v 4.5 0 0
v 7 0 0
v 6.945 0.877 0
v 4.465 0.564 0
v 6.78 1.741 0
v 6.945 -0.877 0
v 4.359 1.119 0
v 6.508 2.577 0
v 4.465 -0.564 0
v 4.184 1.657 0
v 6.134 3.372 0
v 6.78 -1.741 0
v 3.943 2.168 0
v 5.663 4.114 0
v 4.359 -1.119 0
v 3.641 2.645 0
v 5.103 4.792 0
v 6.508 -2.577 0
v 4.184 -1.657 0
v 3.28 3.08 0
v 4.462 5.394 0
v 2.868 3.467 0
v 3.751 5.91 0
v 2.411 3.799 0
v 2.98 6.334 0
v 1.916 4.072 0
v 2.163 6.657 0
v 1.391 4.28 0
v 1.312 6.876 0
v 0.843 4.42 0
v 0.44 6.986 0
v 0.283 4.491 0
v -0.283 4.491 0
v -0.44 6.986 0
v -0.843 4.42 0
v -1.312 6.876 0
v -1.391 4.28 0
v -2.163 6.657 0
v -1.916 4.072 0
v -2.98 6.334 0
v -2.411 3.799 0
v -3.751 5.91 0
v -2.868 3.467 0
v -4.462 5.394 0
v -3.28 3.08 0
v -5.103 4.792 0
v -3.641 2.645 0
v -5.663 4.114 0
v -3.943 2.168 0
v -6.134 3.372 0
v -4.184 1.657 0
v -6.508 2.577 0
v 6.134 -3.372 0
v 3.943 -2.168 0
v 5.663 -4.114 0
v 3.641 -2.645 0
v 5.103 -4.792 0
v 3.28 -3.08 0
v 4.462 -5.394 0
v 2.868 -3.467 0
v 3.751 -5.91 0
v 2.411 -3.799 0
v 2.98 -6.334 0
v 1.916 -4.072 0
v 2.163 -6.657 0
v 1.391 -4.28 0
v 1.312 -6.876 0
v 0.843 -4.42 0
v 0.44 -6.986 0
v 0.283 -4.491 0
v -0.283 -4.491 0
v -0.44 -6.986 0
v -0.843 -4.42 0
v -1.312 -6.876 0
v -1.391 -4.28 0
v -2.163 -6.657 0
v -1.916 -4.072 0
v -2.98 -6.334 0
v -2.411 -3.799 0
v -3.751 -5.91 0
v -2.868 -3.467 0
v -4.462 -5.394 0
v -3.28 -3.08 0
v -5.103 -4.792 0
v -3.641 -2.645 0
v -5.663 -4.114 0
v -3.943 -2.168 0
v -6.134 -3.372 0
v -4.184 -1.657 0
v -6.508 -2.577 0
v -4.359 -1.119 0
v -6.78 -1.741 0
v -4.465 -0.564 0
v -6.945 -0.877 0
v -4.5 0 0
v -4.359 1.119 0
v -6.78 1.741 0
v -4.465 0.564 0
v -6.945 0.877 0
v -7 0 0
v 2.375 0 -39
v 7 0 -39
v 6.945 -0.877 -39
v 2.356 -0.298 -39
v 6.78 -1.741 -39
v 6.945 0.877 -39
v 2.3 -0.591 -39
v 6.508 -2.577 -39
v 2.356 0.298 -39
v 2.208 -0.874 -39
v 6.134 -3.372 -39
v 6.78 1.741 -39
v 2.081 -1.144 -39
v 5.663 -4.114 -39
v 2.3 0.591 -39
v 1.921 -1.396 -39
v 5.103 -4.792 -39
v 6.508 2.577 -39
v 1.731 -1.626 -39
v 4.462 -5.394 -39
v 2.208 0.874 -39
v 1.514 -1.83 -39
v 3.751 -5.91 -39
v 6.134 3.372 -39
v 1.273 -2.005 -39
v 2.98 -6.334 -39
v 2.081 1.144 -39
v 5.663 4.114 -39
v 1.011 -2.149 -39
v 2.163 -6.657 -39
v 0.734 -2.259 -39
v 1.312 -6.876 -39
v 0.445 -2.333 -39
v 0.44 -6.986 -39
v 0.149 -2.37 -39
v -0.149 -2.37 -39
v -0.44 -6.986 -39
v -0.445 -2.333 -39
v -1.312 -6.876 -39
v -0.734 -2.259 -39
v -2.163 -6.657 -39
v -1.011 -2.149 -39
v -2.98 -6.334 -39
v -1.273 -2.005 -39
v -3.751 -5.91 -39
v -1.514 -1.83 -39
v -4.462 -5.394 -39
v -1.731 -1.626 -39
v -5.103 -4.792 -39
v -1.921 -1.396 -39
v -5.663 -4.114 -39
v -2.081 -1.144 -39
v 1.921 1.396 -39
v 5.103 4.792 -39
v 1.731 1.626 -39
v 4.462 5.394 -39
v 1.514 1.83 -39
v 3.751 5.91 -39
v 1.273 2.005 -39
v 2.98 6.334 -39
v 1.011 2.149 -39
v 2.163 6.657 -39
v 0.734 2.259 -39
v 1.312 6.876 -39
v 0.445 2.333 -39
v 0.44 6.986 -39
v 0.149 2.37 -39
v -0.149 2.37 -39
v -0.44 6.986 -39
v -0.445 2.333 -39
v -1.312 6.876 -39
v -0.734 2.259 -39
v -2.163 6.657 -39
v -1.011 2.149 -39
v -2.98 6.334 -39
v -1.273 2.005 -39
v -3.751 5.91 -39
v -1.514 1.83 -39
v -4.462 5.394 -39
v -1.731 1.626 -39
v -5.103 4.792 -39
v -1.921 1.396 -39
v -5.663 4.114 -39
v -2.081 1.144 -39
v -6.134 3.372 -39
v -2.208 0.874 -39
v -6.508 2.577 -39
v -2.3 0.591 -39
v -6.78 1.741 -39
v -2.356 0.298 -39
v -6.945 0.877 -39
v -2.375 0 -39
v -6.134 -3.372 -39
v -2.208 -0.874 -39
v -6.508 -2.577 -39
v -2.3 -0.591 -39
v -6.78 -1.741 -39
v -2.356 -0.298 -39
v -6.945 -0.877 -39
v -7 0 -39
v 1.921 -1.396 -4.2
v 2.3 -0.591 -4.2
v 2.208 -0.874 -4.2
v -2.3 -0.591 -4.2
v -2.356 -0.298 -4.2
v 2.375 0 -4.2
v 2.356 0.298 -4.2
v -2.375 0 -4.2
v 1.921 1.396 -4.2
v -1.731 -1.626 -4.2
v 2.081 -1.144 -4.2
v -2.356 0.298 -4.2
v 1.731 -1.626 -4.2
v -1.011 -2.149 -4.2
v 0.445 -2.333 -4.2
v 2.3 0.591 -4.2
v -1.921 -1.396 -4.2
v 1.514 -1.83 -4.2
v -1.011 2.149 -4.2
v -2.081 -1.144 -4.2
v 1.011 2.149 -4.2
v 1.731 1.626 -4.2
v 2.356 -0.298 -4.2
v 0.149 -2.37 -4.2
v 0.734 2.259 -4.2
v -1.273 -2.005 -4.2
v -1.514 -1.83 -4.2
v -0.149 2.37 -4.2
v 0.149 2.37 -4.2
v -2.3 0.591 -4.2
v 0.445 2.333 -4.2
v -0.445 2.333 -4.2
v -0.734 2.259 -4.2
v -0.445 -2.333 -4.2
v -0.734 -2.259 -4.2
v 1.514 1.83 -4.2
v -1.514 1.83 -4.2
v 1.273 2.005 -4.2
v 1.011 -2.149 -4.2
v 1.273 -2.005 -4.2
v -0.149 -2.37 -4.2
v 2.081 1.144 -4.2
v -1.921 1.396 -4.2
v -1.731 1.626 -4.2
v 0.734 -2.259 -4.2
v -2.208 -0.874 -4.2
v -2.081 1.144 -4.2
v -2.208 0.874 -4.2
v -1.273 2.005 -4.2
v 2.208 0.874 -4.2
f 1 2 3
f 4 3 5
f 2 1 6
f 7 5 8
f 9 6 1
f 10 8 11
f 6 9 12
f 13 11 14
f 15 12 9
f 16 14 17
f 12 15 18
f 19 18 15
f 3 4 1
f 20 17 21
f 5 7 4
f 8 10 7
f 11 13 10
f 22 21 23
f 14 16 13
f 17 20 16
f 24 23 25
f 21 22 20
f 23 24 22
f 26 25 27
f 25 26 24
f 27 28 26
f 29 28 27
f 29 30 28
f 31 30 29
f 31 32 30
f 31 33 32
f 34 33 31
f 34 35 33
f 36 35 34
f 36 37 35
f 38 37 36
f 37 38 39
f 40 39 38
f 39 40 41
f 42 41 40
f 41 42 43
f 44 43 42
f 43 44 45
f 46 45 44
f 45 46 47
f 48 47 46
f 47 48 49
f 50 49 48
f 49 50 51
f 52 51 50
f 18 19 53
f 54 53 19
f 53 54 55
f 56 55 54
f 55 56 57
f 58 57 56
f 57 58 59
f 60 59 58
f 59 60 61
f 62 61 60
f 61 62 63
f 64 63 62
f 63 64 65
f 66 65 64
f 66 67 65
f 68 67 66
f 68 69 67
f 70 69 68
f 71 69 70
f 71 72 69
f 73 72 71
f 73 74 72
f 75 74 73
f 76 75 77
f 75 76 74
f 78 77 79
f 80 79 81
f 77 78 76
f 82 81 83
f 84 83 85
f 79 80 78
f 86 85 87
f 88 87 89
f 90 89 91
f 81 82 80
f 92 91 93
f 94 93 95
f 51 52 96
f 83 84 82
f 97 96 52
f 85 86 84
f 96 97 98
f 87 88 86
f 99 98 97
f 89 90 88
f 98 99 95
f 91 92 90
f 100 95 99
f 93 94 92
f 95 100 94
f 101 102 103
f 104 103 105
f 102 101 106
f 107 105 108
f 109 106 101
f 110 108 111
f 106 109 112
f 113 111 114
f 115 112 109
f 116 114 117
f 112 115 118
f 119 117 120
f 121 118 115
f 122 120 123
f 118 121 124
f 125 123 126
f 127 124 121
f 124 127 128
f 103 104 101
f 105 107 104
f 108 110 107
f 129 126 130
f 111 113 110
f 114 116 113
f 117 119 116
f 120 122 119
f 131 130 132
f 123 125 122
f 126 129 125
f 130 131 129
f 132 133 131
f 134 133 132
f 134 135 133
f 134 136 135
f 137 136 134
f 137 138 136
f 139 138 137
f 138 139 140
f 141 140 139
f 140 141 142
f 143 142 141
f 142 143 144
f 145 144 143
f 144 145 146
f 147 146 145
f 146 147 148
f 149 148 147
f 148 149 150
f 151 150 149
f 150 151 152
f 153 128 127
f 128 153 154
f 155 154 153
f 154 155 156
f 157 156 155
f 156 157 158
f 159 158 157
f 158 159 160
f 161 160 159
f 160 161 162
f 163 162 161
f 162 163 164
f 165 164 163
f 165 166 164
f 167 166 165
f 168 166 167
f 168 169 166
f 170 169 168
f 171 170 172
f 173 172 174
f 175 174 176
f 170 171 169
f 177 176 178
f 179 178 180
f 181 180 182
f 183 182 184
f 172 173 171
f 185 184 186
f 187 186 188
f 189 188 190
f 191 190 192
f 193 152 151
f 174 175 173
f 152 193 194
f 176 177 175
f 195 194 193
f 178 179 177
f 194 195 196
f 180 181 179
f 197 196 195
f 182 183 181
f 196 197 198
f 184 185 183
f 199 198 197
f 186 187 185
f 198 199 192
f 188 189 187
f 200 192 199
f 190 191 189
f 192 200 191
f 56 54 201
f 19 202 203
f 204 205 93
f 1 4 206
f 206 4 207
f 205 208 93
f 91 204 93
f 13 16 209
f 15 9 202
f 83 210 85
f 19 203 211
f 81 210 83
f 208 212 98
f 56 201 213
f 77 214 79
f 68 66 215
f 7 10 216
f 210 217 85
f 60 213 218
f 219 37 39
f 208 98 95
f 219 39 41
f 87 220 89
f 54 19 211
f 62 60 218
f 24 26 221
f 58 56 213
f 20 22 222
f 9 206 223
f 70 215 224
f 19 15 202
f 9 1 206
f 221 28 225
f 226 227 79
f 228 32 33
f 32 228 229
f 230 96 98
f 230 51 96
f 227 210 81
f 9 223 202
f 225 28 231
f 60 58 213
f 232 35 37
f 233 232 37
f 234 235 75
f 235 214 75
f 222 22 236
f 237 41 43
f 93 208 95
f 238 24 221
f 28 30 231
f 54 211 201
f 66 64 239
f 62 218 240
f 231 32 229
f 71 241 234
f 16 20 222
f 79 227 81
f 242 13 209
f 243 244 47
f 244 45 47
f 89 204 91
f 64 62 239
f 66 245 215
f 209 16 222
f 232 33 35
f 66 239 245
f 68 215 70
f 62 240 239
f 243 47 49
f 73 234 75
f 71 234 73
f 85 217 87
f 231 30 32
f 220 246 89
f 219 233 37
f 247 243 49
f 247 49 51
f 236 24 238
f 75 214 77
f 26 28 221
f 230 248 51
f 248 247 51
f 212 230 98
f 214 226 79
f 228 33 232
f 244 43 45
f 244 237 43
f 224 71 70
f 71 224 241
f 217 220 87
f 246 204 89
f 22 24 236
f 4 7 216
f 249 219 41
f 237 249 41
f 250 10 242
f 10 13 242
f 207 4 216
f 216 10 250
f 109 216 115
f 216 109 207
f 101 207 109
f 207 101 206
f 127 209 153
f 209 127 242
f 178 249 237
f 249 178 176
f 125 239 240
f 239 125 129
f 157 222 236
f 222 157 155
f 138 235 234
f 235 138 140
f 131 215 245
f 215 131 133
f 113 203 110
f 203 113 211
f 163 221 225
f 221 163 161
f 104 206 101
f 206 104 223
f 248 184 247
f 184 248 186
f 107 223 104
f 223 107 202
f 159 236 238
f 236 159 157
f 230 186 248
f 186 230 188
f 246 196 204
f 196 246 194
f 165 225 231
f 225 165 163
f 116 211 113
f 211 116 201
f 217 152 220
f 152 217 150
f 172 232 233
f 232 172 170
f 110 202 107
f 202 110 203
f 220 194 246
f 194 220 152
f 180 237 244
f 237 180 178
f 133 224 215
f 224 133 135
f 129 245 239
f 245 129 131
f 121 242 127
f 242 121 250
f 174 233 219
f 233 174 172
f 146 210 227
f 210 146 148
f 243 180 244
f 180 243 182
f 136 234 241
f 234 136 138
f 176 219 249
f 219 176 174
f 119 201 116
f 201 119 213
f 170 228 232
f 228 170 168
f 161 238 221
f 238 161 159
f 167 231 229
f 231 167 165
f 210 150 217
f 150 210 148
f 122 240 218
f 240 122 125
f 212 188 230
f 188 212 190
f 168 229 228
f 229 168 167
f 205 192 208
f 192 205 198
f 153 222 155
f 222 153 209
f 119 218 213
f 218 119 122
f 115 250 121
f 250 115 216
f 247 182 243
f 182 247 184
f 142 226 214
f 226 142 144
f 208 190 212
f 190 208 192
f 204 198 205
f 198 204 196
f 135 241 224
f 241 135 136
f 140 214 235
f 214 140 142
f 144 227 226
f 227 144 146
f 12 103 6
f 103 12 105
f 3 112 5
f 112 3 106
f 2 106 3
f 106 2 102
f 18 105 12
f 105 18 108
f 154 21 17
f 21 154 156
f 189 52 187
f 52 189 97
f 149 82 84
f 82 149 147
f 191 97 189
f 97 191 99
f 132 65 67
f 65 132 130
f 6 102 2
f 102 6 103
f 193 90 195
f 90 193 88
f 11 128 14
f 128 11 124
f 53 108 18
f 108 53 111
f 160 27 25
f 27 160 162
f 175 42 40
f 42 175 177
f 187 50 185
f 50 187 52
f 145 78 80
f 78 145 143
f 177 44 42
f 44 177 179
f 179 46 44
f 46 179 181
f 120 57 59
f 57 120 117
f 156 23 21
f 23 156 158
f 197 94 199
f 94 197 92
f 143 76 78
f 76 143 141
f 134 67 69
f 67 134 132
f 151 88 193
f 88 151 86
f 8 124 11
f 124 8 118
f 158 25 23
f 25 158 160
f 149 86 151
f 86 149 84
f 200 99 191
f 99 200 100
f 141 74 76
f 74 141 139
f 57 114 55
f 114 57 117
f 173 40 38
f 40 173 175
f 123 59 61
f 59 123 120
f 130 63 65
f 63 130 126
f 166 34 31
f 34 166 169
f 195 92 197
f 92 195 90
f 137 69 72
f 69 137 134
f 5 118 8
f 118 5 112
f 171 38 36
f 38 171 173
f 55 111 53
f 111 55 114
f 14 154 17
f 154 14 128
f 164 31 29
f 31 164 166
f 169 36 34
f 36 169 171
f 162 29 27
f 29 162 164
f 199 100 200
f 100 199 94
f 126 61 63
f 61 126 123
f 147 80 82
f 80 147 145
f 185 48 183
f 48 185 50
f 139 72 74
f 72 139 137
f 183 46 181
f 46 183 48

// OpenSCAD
$fn = 50;


difference() {
	union() {
		translate(v = [0, 0, -39.0000000000]) {
			cylinder(h = 39, r = 7.0000000000);
		}
	}
	union() {
		translate(v = [0, 0, 0]) {
			rotate(a = [0, 0, 0]) {
				difference() {
					union() {
						#translate(v = [0, 0, -39.0000000000]) {
							cylinder(h = 39, r = 2.2500000000);
						}
						#translate(v = [0, 0, -4.2000000000]) {
							cylinder(h = 4.2000000000, r = 7.0000000000, r1 = 2.3750000000, r2 = 4.5000000000);
						}
						#translate(v = [0, 0, -39.0000000000]) {
							cylinder(h = 39, r = 2.3750000000);
						}
						#translate(v = [0, 0, -39.0000000000]) {
							cylinder(h = 39, r = 2.2500000000);
						}
					}
					union();
				}
			}
		}
	}
}
